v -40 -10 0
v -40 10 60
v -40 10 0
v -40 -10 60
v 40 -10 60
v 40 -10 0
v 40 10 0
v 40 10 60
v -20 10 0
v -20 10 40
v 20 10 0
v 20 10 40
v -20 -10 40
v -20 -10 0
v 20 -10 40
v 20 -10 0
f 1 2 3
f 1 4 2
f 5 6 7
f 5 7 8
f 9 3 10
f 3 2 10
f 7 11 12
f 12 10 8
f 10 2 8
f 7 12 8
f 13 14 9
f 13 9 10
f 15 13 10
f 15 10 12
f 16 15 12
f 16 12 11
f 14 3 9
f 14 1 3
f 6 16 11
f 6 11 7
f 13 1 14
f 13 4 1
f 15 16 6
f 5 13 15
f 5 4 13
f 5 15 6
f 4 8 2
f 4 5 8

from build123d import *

# Parameters (mm, degrees)
PAD_DEPTH = 10


with BuildPart() as part:
    # Sketch → Pad (new body, symmetric)
    with BuildSketch(Plane.XZ):
        Polygon((-40, 0), (-20, 0), (-20, 40), (20, 40), (20, 0), (40, 0), (40, 60), (-40, 60), align=None)
    extrude(amount=PAD_DEPTH, both=True)


solid = part.part
